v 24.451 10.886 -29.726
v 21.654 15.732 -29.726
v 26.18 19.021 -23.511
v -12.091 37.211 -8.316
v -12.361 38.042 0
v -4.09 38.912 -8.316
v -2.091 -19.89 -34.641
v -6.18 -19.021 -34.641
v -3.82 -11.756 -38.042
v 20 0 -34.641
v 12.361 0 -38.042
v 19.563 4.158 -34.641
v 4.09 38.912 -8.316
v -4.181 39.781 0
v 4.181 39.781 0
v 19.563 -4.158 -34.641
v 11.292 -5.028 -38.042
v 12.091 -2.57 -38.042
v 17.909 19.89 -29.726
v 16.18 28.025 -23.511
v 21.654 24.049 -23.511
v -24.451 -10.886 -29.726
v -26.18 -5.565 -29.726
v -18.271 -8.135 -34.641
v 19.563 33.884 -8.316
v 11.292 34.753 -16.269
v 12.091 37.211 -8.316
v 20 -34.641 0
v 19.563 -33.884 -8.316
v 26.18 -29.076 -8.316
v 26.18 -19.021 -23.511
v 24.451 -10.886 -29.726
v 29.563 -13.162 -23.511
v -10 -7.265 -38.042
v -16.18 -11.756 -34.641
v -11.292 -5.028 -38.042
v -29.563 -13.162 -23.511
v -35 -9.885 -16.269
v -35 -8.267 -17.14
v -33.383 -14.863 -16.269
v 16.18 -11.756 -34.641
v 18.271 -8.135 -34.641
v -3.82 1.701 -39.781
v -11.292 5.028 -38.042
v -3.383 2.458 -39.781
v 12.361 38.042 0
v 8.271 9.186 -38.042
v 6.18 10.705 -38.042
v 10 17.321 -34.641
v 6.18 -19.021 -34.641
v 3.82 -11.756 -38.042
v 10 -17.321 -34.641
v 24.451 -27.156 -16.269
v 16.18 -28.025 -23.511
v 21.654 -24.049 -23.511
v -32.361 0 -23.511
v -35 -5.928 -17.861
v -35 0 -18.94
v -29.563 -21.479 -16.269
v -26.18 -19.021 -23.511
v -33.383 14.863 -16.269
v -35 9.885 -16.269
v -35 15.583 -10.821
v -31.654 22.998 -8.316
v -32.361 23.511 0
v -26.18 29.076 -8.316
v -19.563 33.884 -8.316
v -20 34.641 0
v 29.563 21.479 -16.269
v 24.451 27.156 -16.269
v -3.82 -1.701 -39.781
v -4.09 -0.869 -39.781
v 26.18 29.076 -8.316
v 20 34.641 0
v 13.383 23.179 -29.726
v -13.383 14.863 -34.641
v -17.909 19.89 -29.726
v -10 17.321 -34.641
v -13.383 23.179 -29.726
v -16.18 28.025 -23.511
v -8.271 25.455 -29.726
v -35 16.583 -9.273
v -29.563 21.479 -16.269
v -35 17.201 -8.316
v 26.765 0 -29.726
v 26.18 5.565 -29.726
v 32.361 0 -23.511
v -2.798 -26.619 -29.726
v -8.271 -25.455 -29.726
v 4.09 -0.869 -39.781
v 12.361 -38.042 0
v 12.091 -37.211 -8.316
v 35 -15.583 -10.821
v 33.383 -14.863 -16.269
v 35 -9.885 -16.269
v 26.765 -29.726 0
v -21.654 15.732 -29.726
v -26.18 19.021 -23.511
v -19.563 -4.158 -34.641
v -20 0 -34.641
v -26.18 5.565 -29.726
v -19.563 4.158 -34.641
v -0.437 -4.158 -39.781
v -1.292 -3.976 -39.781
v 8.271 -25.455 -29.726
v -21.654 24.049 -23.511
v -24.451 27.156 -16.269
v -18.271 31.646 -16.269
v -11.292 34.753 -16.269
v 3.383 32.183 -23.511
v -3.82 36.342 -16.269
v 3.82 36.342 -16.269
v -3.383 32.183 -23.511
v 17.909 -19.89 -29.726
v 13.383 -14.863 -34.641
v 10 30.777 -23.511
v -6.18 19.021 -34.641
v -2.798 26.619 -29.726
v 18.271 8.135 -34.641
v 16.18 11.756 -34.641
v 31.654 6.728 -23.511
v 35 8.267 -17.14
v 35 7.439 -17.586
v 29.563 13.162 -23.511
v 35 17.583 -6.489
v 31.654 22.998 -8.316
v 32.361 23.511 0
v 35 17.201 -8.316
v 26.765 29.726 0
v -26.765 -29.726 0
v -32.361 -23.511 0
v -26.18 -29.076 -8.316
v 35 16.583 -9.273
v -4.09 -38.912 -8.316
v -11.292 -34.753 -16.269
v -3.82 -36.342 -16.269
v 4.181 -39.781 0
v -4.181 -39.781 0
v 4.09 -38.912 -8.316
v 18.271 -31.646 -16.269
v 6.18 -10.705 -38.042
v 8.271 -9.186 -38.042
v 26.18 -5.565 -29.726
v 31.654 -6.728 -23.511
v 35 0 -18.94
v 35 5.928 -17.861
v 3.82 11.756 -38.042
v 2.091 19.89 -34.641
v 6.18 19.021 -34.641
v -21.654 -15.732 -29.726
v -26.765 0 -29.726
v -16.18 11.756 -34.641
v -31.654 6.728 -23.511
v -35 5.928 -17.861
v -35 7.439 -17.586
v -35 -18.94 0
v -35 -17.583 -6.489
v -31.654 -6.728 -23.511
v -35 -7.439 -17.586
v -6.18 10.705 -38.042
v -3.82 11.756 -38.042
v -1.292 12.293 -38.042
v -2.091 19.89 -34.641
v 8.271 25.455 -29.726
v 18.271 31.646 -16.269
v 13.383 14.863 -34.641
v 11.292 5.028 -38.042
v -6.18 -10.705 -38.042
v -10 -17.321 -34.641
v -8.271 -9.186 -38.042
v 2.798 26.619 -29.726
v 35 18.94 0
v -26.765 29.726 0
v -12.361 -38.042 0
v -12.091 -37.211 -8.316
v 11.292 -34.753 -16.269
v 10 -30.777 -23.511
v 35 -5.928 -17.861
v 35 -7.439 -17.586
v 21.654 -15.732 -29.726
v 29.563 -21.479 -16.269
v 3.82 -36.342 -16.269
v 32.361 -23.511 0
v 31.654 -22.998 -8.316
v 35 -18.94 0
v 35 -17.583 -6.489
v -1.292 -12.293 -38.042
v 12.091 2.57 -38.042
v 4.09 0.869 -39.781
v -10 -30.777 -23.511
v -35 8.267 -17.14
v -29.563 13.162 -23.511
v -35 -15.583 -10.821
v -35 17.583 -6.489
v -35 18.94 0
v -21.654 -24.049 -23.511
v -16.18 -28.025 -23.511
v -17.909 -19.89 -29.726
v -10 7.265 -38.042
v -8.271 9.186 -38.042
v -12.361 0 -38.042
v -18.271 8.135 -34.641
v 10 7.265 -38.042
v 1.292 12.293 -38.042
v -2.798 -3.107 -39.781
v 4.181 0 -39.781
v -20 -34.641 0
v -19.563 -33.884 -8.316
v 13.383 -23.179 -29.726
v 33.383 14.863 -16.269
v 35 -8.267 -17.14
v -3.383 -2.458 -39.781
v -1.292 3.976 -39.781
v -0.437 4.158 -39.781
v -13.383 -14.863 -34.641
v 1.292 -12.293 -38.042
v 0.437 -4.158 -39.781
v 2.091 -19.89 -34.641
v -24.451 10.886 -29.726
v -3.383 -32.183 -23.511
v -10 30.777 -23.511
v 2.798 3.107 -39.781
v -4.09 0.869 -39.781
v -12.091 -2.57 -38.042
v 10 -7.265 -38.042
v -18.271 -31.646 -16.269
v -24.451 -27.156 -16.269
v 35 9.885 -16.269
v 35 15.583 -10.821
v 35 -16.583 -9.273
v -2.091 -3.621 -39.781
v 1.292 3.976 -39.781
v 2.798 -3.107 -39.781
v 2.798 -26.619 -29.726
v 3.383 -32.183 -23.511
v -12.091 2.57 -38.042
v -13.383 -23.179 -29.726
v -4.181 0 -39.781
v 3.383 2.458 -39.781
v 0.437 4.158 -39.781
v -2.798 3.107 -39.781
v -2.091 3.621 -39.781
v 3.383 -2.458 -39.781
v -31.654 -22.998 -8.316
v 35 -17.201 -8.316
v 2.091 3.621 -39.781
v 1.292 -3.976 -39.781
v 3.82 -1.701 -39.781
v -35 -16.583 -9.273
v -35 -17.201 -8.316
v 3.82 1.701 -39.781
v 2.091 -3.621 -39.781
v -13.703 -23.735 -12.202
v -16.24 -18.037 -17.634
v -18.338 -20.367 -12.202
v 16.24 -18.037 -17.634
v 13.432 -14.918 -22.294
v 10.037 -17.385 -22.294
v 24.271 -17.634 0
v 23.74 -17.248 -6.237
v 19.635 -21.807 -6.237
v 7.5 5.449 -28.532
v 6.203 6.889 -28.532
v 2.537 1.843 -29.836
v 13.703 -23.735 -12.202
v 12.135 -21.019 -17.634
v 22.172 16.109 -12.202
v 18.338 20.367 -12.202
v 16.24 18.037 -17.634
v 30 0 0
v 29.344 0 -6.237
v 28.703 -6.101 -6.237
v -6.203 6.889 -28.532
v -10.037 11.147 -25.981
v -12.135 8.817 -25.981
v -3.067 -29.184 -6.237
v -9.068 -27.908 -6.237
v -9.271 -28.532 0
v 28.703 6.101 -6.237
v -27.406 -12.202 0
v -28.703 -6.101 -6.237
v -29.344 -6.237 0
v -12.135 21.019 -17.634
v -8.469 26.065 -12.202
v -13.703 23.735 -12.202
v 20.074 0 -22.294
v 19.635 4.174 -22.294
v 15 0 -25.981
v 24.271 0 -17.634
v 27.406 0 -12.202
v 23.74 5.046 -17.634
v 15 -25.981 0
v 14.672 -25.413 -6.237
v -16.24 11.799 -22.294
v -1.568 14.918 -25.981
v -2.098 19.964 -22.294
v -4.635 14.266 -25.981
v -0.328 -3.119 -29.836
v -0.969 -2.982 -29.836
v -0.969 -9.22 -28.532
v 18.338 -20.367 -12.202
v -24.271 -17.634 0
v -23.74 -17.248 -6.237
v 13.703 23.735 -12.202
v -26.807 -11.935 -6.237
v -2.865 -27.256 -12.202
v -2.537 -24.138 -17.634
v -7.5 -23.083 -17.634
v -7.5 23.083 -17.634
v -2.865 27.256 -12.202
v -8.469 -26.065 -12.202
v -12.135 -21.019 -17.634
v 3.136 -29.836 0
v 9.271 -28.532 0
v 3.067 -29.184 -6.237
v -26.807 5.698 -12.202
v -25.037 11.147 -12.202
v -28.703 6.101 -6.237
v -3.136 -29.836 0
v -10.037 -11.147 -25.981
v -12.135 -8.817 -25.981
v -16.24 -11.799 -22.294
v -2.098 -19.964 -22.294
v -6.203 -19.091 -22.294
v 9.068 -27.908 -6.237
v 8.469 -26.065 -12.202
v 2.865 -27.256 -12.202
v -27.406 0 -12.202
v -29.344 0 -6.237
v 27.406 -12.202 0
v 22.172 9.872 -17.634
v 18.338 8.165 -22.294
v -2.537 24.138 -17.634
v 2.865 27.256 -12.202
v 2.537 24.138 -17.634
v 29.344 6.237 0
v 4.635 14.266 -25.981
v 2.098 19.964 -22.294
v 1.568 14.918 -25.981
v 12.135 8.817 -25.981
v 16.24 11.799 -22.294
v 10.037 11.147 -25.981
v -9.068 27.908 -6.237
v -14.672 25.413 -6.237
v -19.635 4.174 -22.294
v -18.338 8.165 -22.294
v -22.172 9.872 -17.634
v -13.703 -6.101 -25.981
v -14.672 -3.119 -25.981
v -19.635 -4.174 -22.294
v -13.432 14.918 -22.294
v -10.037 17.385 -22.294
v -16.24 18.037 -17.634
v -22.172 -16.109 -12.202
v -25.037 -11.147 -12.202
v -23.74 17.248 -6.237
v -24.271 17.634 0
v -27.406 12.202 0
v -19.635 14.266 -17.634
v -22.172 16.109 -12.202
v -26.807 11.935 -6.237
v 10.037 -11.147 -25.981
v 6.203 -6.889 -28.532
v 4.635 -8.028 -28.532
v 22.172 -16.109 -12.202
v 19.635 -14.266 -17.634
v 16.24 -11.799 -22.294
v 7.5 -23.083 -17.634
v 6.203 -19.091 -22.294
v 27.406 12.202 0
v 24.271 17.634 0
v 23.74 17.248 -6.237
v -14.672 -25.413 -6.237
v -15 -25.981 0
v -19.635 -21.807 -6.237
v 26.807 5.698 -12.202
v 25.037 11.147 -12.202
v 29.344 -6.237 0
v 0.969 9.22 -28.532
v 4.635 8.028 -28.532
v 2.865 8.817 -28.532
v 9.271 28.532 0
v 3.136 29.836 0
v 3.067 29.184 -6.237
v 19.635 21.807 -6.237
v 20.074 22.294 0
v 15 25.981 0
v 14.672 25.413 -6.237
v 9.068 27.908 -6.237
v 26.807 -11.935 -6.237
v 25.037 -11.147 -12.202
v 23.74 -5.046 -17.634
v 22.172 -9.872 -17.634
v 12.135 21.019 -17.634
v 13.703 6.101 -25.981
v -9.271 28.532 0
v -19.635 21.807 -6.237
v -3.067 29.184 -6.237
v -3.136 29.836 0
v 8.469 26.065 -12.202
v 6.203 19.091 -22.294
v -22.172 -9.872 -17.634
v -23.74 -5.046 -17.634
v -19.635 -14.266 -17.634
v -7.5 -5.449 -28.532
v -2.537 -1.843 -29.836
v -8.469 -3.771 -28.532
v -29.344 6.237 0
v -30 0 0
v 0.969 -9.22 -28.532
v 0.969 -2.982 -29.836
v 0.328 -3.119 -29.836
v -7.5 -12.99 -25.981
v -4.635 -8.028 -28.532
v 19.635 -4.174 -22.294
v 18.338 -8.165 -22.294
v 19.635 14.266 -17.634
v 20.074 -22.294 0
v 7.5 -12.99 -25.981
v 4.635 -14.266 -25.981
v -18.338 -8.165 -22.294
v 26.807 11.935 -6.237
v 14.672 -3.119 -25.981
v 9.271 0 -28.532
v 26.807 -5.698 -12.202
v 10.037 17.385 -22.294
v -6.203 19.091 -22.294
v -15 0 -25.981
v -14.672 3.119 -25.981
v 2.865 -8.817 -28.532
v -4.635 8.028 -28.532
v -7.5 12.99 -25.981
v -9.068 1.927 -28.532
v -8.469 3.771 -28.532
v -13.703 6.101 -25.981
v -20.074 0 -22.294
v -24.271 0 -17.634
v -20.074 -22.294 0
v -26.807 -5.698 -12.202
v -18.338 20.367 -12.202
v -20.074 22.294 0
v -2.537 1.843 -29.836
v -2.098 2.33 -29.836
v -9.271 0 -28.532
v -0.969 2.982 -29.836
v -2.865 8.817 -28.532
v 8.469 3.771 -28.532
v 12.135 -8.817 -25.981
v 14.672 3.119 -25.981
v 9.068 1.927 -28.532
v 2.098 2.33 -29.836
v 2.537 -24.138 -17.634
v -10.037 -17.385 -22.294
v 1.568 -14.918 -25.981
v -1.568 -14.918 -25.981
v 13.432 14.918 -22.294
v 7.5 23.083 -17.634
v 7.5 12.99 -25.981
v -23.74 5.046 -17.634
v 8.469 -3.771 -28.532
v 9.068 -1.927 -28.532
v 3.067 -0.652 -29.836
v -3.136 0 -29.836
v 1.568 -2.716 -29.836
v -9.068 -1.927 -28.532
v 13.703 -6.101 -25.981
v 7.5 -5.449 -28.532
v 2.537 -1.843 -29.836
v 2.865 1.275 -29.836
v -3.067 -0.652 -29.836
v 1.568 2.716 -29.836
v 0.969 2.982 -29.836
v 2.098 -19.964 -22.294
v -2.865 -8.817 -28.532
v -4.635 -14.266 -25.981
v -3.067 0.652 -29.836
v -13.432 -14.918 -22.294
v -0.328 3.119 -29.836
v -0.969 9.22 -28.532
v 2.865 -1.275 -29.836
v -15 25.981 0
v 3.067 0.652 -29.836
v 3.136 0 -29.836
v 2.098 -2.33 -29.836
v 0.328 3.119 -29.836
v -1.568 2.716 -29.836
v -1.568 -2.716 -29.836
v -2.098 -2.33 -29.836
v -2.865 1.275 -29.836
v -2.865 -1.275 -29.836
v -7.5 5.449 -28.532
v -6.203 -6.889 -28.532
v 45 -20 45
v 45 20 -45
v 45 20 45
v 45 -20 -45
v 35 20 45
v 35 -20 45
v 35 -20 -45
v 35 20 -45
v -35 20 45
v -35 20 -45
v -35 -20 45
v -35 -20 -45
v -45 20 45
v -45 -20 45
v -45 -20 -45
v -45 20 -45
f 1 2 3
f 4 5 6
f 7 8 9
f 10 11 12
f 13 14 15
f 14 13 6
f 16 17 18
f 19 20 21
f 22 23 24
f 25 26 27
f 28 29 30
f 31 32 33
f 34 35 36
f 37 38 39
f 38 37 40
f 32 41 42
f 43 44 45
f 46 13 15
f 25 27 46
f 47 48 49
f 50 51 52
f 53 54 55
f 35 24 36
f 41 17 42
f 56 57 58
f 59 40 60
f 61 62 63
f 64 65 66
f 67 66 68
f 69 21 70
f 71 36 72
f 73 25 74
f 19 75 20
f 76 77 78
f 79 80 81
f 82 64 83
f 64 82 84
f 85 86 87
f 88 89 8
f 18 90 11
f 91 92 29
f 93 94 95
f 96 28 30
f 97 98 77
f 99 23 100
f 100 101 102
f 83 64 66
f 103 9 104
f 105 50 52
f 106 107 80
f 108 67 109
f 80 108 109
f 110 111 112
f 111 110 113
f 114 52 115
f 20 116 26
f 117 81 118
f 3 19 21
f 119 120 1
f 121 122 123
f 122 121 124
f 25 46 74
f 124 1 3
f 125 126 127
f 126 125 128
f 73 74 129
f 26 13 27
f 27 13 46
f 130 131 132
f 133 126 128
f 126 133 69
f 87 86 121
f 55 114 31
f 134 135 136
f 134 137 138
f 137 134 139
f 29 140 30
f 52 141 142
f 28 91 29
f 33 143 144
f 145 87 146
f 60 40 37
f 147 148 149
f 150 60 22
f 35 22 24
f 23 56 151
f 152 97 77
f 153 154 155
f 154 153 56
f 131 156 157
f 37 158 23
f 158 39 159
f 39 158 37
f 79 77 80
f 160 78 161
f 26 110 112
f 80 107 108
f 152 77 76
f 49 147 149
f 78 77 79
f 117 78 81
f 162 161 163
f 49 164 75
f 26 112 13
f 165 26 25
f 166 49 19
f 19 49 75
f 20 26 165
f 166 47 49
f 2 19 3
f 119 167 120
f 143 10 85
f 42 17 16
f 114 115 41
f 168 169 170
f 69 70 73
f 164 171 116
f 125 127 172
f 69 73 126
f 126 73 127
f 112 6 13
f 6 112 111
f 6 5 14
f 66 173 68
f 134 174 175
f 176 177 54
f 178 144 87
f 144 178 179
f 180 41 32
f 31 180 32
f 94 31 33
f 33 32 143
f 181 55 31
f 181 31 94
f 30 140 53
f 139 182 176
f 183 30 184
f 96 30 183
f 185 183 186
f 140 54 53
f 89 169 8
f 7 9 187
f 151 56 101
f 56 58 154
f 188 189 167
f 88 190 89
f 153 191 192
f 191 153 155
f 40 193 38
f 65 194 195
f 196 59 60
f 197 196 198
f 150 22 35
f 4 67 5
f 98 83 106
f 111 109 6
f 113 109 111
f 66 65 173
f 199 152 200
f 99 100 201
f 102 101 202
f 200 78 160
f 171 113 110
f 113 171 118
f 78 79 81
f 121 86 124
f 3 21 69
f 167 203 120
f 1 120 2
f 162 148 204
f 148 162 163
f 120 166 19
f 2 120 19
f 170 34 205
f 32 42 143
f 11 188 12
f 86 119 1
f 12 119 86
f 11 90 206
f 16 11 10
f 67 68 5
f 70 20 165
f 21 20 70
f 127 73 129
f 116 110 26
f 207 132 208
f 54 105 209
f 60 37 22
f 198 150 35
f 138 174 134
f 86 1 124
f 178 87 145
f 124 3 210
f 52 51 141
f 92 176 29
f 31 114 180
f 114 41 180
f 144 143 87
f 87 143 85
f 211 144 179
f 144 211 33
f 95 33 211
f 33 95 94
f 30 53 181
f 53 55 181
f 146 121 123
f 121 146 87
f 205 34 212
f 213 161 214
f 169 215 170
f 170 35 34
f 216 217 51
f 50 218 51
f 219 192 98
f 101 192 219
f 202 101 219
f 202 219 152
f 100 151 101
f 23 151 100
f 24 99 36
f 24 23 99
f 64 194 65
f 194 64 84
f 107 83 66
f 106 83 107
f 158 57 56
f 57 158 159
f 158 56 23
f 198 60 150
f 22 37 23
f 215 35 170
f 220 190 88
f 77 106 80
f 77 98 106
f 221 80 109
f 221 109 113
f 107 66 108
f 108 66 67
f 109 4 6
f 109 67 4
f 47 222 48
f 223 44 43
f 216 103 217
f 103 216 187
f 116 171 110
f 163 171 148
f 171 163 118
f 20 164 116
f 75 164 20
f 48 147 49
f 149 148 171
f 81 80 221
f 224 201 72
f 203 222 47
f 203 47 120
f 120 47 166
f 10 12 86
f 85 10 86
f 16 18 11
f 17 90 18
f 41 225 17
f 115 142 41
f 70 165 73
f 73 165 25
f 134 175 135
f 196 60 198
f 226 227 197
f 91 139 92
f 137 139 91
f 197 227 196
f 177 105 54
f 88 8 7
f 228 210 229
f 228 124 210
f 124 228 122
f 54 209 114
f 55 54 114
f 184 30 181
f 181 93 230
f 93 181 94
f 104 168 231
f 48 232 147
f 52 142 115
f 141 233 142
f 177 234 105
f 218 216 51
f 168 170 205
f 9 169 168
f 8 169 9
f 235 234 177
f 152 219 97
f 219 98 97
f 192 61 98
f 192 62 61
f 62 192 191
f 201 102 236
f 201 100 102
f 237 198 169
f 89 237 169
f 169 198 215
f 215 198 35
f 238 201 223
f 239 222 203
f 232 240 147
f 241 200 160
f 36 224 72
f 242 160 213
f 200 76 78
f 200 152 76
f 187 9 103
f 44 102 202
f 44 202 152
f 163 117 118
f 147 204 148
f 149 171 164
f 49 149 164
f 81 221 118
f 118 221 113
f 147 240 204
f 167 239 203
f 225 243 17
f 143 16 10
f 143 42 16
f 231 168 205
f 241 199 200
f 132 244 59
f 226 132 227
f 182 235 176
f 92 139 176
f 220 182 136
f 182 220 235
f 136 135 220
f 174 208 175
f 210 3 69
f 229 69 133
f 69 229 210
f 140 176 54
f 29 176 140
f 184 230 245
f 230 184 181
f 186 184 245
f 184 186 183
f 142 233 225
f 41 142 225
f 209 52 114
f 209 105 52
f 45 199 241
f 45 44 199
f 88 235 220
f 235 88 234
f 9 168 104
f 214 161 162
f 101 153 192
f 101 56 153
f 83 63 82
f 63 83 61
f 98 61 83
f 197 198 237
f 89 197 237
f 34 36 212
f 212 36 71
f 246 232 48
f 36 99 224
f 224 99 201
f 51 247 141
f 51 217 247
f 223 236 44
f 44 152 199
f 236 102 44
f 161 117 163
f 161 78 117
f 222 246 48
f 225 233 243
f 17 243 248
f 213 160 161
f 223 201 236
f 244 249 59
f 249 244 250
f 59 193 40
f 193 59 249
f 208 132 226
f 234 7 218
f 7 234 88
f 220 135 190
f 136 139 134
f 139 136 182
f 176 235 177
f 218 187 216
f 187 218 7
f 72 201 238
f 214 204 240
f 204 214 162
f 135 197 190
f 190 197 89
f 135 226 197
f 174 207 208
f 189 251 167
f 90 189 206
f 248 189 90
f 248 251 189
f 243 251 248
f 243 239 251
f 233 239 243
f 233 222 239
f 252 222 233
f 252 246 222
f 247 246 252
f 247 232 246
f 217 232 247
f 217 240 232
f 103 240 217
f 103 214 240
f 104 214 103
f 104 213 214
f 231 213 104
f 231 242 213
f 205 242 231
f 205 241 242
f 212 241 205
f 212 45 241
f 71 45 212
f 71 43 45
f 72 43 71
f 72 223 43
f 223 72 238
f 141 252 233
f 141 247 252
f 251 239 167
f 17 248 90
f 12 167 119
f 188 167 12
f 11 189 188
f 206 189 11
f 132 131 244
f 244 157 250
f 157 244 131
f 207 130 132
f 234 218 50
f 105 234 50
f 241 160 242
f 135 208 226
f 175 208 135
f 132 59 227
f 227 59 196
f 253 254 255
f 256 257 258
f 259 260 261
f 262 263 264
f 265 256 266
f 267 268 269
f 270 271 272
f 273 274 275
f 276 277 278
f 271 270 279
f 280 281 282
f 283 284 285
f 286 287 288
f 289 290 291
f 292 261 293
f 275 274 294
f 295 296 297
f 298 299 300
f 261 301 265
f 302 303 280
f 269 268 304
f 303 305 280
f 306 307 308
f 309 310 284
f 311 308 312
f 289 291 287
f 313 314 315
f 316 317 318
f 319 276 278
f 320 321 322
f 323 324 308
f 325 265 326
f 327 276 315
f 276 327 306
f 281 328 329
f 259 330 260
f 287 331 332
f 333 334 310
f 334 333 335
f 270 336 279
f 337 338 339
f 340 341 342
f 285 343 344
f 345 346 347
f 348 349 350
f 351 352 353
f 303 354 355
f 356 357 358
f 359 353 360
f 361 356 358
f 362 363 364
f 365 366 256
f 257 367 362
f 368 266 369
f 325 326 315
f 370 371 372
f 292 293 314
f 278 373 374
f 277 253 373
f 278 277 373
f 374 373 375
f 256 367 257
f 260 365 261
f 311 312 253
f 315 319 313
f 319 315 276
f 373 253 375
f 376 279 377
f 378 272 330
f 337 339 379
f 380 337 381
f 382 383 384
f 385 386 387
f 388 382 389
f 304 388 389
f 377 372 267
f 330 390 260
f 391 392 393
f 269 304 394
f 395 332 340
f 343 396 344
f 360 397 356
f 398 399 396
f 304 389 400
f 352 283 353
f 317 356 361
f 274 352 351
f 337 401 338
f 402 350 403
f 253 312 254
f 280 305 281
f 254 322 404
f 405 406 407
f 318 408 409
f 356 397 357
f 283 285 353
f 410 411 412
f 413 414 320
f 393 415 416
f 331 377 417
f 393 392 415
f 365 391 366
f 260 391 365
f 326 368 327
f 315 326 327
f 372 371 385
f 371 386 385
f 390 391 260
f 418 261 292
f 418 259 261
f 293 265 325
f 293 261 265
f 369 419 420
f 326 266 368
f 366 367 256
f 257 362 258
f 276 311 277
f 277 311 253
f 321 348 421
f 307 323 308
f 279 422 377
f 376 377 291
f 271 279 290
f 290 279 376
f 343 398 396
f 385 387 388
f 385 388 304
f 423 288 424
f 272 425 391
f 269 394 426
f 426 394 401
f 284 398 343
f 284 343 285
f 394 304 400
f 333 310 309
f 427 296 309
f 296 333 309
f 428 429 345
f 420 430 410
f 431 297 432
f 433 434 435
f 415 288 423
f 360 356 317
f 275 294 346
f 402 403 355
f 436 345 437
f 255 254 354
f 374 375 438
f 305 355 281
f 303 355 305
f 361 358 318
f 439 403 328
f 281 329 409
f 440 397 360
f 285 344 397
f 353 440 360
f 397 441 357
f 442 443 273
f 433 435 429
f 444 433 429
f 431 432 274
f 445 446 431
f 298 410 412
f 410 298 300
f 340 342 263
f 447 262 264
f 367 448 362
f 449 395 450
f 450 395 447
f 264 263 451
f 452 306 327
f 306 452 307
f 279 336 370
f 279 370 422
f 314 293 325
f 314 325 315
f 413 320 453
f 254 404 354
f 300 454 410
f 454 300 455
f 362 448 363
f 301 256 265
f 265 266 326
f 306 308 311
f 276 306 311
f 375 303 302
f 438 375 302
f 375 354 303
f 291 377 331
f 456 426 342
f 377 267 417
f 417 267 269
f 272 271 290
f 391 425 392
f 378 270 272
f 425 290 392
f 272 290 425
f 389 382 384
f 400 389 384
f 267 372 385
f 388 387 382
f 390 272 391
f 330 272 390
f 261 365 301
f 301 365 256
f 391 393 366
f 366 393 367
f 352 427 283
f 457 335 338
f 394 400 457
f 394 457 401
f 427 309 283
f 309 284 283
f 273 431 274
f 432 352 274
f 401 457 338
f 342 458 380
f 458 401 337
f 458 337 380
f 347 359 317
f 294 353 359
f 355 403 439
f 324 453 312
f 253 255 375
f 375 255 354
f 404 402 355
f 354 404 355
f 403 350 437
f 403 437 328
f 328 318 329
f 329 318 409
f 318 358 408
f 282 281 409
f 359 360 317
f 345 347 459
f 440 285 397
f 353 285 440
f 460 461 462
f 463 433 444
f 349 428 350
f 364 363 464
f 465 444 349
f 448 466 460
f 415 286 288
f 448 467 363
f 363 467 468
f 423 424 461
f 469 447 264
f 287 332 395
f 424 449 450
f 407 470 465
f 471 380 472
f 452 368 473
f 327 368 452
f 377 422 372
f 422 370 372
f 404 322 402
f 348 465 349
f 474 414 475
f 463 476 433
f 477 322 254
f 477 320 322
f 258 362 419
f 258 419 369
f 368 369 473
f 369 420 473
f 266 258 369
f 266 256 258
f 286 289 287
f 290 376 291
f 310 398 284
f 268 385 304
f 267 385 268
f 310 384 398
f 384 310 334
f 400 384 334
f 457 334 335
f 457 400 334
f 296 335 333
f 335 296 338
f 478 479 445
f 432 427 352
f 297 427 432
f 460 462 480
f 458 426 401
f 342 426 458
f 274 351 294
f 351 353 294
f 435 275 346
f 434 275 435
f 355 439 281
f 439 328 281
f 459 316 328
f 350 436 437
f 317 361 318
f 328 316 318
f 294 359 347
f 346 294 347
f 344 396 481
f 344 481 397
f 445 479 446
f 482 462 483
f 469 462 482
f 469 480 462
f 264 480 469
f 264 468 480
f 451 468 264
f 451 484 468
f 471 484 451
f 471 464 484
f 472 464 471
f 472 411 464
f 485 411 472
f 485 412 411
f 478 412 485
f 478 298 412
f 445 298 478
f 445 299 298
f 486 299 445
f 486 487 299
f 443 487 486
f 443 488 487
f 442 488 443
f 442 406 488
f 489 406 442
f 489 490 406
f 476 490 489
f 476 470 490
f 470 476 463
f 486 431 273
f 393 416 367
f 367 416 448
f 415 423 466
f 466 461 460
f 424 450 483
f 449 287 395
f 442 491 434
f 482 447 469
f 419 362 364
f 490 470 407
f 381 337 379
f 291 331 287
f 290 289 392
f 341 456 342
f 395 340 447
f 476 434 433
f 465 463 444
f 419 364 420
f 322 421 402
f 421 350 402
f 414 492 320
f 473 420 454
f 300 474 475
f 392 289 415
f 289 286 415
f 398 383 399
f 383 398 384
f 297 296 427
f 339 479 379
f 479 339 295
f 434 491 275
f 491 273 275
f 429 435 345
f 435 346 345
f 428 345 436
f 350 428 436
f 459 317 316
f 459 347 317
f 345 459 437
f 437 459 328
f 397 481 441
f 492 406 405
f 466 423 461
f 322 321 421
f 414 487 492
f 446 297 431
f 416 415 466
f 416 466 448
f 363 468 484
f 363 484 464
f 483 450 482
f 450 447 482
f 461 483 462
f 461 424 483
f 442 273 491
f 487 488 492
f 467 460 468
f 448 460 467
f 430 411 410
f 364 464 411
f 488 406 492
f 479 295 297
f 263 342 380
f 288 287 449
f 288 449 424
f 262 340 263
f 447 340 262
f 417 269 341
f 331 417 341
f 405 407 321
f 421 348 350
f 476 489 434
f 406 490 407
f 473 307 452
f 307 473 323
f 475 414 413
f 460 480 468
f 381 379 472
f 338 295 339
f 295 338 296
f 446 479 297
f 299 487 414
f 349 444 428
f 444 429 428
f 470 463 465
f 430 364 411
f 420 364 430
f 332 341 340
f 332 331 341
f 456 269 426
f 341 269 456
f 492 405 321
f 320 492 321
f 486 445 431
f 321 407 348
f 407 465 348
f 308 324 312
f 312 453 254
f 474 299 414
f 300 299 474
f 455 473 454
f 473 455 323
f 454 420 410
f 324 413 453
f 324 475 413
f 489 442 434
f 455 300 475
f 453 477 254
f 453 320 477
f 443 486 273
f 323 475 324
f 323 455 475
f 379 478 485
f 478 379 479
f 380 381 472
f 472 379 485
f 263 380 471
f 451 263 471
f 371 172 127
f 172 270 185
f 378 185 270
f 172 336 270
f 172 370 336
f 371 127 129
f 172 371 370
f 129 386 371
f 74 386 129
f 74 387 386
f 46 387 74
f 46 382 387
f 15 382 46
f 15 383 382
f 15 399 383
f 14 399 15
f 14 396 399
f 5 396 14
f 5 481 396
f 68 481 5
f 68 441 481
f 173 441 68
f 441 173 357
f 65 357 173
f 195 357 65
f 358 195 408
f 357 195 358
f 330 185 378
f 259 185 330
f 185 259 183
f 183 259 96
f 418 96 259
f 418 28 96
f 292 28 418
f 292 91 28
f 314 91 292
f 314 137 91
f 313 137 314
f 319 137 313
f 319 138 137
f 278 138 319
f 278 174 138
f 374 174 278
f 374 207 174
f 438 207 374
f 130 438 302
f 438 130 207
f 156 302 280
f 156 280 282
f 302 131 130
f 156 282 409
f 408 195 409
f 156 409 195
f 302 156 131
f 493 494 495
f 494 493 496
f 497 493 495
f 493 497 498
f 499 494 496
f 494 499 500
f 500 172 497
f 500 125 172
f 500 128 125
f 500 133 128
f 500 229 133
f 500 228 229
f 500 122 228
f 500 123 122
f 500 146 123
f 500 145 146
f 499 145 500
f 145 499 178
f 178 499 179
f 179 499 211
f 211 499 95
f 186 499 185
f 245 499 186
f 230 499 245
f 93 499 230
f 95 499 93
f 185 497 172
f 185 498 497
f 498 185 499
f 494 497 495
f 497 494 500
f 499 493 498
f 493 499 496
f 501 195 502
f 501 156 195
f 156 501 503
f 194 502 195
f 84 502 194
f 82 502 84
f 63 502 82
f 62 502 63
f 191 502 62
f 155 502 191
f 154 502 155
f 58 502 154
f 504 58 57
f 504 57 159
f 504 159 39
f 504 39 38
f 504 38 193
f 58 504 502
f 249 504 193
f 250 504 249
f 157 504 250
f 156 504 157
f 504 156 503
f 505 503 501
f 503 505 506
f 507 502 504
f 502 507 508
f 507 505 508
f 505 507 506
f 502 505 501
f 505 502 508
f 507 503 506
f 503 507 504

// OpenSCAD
translate([35,-20,-45]) {
	cube([10,40,90],0);
}
translate([-45,-20,-45]) {
	cube([10,40,90],0);
}
difference() {
	sphere(40);
	sphere(30);
	cylinder(h=60,r=40);
}
